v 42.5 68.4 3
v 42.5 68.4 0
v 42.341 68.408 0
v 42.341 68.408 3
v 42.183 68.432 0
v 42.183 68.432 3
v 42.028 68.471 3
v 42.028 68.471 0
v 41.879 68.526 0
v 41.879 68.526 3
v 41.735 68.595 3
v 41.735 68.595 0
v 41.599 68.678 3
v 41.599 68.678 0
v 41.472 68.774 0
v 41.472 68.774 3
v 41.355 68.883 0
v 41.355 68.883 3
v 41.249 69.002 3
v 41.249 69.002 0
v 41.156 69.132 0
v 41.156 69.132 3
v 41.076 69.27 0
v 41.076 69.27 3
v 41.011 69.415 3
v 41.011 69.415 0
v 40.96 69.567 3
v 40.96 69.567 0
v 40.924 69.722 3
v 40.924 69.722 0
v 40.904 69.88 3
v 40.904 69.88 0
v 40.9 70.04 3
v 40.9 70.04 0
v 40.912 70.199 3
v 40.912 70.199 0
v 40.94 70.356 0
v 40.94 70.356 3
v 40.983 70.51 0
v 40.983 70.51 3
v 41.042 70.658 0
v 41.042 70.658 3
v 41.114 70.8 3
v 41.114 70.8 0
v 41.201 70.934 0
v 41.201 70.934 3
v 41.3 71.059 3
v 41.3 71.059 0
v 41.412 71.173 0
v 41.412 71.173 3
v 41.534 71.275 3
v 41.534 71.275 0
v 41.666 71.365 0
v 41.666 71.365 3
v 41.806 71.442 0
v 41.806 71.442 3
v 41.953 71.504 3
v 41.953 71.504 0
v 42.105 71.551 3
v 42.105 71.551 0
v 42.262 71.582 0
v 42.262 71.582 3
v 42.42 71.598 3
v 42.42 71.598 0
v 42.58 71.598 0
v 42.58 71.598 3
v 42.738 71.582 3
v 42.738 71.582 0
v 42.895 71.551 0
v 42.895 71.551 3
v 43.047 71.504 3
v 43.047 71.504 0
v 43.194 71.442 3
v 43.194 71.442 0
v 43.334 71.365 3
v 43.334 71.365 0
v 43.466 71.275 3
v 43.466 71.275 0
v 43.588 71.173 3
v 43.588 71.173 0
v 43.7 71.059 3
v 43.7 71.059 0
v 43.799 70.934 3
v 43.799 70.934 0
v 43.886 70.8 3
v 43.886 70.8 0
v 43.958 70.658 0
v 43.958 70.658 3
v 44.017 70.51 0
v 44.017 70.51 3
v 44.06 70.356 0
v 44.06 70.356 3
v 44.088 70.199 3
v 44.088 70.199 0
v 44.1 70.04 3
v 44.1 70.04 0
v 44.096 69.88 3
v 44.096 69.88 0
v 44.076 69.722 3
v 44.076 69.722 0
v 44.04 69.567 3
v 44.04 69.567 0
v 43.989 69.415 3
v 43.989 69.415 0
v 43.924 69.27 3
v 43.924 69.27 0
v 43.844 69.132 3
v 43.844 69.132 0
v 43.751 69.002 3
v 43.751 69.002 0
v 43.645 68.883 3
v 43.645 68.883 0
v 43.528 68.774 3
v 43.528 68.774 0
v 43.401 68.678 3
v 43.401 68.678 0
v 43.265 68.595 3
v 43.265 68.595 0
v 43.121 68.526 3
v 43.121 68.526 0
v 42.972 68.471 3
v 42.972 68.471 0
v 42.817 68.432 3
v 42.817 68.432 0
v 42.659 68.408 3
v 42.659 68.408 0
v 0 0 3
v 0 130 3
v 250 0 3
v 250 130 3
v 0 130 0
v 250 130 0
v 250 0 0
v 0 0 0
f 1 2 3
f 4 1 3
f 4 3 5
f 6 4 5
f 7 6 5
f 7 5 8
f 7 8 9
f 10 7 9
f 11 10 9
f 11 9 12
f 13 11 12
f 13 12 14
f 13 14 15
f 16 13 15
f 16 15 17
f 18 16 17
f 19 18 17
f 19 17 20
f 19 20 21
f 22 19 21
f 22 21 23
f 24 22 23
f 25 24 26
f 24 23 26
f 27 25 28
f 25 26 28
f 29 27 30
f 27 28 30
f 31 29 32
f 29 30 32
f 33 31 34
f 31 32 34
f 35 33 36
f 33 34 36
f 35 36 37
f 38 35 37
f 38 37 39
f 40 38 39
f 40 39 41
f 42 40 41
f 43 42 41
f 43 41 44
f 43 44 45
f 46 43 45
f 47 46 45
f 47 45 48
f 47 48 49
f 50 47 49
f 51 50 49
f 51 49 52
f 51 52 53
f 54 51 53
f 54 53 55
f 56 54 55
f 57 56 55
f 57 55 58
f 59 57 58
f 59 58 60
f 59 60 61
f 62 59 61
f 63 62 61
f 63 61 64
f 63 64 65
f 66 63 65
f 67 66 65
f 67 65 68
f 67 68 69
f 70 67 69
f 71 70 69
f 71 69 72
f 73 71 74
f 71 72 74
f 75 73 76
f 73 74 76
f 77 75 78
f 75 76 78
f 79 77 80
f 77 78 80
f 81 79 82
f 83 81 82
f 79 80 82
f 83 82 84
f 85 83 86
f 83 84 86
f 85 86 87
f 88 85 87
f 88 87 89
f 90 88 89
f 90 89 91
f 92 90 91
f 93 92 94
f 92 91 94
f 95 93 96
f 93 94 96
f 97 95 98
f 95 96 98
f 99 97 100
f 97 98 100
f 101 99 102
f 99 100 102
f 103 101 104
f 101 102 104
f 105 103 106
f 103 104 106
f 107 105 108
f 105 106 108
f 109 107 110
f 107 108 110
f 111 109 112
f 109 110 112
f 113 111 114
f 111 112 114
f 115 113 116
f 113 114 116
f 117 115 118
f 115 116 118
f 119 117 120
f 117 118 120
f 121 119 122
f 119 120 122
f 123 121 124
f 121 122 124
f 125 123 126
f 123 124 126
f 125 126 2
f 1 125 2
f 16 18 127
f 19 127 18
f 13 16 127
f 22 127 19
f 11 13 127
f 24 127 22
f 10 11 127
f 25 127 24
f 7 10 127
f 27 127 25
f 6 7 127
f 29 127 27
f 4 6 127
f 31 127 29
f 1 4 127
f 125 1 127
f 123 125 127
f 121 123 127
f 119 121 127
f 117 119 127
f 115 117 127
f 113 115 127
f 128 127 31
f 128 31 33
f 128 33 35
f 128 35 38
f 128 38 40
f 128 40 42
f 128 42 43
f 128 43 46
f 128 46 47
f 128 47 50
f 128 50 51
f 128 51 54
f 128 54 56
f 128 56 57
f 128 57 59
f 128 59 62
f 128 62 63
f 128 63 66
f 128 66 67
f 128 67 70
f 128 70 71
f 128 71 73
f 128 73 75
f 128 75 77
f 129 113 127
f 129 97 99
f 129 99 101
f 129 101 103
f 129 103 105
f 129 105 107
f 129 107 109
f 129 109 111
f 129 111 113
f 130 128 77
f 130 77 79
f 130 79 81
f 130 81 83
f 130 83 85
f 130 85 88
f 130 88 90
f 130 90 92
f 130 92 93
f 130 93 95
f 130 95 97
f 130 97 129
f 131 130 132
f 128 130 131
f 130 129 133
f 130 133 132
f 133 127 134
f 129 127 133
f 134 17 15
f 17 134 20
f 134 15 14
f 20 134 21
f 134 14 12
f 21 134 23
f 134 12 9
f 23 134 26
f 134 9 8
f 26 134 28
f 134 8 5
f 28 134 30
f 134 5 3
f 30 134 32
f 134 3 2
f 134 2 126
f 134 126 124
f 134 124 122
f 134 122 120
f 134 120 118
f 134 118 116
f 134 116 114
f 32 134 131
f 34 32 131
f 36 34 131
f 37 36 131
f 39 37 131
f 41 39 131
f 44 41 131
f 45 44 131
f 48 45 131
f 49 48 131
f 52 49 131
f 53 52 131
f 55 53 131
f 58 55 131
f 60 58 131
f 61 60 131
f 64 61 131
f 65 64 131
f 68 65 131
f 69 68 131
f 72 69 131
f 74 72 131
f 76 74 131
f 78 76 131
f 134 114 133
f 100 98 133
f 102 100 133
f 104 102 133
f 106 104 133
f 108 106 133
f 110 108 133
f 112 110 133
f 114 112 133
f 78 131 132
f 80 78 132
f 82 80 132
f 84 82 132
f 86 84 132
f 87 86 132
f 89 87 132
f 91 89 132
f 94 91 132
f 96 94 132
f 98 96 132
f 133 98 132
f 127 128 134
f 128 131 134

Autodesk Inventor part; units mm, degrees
ref_plane "YZ Plane" through (0, 0, 0) normal (1, 0, 0) x (0, 1, 0)
ref_plane "XZ Plane" through (0, 0, 0) normal (0, 1, 0) x (-1, 0, 0)
ref_plane "XY Plane" through (0, 0, 0) normal (0, 0, 1) x (1, 0, 0)
sketch "スケッチ1" plane through (0, 0, 0) normal (0, 0, 1) x (1, 0, 0)
  line L0 (0, 0) -> (85, 0)
  line L1 (85, 0) -> (85, 130)
  line L2 (85, 130) -> (0, 130)
  line L3 (0, 130) -> (0, 0)
  dimension "d0" = 85
  dimension "d1" = 130
extrude "押し出し1" add sketch "スケッチ1" along normal blind 3
sketch "スケッチ2" plane through (0, 0, 3) normal (0, 0, 1) x (1, 0, 0)
  circle A0 centre (42.5, 70) radius 1.6
  line L0 (85, 130) -> (0, 130) projected
  line L1 (85, 0) -> (85, 130) projected
  point P0 (0, 0)
  dimension "d4" = 3.2
  dimension "d5" = 60
  dimension "d6" = 42.5
hole "穴1" at (42.5, 70, 3) direction (0, 0, -1) diameter 3.2 end through all
sketch "スケッチ3" plane through (0, 0, 3) normal (0, 0, 1) x (1, 0, 0)
  line L0 (0, 0) -> (85, 0) projected
  line L1 (85, 0) -> (250, 0)
  line L2 (250, 0) -> (250, 130)
  line L3 (250, 130) -> (85, 130)
  line L4 (85, 130) -> (85, 0)
  dimension "d14" = 165
  dimension "d15" = 130
extrude "押し出し2" add sketch "スケッチ3" against normal blind 3
properties part number "NHK_t0_11"
